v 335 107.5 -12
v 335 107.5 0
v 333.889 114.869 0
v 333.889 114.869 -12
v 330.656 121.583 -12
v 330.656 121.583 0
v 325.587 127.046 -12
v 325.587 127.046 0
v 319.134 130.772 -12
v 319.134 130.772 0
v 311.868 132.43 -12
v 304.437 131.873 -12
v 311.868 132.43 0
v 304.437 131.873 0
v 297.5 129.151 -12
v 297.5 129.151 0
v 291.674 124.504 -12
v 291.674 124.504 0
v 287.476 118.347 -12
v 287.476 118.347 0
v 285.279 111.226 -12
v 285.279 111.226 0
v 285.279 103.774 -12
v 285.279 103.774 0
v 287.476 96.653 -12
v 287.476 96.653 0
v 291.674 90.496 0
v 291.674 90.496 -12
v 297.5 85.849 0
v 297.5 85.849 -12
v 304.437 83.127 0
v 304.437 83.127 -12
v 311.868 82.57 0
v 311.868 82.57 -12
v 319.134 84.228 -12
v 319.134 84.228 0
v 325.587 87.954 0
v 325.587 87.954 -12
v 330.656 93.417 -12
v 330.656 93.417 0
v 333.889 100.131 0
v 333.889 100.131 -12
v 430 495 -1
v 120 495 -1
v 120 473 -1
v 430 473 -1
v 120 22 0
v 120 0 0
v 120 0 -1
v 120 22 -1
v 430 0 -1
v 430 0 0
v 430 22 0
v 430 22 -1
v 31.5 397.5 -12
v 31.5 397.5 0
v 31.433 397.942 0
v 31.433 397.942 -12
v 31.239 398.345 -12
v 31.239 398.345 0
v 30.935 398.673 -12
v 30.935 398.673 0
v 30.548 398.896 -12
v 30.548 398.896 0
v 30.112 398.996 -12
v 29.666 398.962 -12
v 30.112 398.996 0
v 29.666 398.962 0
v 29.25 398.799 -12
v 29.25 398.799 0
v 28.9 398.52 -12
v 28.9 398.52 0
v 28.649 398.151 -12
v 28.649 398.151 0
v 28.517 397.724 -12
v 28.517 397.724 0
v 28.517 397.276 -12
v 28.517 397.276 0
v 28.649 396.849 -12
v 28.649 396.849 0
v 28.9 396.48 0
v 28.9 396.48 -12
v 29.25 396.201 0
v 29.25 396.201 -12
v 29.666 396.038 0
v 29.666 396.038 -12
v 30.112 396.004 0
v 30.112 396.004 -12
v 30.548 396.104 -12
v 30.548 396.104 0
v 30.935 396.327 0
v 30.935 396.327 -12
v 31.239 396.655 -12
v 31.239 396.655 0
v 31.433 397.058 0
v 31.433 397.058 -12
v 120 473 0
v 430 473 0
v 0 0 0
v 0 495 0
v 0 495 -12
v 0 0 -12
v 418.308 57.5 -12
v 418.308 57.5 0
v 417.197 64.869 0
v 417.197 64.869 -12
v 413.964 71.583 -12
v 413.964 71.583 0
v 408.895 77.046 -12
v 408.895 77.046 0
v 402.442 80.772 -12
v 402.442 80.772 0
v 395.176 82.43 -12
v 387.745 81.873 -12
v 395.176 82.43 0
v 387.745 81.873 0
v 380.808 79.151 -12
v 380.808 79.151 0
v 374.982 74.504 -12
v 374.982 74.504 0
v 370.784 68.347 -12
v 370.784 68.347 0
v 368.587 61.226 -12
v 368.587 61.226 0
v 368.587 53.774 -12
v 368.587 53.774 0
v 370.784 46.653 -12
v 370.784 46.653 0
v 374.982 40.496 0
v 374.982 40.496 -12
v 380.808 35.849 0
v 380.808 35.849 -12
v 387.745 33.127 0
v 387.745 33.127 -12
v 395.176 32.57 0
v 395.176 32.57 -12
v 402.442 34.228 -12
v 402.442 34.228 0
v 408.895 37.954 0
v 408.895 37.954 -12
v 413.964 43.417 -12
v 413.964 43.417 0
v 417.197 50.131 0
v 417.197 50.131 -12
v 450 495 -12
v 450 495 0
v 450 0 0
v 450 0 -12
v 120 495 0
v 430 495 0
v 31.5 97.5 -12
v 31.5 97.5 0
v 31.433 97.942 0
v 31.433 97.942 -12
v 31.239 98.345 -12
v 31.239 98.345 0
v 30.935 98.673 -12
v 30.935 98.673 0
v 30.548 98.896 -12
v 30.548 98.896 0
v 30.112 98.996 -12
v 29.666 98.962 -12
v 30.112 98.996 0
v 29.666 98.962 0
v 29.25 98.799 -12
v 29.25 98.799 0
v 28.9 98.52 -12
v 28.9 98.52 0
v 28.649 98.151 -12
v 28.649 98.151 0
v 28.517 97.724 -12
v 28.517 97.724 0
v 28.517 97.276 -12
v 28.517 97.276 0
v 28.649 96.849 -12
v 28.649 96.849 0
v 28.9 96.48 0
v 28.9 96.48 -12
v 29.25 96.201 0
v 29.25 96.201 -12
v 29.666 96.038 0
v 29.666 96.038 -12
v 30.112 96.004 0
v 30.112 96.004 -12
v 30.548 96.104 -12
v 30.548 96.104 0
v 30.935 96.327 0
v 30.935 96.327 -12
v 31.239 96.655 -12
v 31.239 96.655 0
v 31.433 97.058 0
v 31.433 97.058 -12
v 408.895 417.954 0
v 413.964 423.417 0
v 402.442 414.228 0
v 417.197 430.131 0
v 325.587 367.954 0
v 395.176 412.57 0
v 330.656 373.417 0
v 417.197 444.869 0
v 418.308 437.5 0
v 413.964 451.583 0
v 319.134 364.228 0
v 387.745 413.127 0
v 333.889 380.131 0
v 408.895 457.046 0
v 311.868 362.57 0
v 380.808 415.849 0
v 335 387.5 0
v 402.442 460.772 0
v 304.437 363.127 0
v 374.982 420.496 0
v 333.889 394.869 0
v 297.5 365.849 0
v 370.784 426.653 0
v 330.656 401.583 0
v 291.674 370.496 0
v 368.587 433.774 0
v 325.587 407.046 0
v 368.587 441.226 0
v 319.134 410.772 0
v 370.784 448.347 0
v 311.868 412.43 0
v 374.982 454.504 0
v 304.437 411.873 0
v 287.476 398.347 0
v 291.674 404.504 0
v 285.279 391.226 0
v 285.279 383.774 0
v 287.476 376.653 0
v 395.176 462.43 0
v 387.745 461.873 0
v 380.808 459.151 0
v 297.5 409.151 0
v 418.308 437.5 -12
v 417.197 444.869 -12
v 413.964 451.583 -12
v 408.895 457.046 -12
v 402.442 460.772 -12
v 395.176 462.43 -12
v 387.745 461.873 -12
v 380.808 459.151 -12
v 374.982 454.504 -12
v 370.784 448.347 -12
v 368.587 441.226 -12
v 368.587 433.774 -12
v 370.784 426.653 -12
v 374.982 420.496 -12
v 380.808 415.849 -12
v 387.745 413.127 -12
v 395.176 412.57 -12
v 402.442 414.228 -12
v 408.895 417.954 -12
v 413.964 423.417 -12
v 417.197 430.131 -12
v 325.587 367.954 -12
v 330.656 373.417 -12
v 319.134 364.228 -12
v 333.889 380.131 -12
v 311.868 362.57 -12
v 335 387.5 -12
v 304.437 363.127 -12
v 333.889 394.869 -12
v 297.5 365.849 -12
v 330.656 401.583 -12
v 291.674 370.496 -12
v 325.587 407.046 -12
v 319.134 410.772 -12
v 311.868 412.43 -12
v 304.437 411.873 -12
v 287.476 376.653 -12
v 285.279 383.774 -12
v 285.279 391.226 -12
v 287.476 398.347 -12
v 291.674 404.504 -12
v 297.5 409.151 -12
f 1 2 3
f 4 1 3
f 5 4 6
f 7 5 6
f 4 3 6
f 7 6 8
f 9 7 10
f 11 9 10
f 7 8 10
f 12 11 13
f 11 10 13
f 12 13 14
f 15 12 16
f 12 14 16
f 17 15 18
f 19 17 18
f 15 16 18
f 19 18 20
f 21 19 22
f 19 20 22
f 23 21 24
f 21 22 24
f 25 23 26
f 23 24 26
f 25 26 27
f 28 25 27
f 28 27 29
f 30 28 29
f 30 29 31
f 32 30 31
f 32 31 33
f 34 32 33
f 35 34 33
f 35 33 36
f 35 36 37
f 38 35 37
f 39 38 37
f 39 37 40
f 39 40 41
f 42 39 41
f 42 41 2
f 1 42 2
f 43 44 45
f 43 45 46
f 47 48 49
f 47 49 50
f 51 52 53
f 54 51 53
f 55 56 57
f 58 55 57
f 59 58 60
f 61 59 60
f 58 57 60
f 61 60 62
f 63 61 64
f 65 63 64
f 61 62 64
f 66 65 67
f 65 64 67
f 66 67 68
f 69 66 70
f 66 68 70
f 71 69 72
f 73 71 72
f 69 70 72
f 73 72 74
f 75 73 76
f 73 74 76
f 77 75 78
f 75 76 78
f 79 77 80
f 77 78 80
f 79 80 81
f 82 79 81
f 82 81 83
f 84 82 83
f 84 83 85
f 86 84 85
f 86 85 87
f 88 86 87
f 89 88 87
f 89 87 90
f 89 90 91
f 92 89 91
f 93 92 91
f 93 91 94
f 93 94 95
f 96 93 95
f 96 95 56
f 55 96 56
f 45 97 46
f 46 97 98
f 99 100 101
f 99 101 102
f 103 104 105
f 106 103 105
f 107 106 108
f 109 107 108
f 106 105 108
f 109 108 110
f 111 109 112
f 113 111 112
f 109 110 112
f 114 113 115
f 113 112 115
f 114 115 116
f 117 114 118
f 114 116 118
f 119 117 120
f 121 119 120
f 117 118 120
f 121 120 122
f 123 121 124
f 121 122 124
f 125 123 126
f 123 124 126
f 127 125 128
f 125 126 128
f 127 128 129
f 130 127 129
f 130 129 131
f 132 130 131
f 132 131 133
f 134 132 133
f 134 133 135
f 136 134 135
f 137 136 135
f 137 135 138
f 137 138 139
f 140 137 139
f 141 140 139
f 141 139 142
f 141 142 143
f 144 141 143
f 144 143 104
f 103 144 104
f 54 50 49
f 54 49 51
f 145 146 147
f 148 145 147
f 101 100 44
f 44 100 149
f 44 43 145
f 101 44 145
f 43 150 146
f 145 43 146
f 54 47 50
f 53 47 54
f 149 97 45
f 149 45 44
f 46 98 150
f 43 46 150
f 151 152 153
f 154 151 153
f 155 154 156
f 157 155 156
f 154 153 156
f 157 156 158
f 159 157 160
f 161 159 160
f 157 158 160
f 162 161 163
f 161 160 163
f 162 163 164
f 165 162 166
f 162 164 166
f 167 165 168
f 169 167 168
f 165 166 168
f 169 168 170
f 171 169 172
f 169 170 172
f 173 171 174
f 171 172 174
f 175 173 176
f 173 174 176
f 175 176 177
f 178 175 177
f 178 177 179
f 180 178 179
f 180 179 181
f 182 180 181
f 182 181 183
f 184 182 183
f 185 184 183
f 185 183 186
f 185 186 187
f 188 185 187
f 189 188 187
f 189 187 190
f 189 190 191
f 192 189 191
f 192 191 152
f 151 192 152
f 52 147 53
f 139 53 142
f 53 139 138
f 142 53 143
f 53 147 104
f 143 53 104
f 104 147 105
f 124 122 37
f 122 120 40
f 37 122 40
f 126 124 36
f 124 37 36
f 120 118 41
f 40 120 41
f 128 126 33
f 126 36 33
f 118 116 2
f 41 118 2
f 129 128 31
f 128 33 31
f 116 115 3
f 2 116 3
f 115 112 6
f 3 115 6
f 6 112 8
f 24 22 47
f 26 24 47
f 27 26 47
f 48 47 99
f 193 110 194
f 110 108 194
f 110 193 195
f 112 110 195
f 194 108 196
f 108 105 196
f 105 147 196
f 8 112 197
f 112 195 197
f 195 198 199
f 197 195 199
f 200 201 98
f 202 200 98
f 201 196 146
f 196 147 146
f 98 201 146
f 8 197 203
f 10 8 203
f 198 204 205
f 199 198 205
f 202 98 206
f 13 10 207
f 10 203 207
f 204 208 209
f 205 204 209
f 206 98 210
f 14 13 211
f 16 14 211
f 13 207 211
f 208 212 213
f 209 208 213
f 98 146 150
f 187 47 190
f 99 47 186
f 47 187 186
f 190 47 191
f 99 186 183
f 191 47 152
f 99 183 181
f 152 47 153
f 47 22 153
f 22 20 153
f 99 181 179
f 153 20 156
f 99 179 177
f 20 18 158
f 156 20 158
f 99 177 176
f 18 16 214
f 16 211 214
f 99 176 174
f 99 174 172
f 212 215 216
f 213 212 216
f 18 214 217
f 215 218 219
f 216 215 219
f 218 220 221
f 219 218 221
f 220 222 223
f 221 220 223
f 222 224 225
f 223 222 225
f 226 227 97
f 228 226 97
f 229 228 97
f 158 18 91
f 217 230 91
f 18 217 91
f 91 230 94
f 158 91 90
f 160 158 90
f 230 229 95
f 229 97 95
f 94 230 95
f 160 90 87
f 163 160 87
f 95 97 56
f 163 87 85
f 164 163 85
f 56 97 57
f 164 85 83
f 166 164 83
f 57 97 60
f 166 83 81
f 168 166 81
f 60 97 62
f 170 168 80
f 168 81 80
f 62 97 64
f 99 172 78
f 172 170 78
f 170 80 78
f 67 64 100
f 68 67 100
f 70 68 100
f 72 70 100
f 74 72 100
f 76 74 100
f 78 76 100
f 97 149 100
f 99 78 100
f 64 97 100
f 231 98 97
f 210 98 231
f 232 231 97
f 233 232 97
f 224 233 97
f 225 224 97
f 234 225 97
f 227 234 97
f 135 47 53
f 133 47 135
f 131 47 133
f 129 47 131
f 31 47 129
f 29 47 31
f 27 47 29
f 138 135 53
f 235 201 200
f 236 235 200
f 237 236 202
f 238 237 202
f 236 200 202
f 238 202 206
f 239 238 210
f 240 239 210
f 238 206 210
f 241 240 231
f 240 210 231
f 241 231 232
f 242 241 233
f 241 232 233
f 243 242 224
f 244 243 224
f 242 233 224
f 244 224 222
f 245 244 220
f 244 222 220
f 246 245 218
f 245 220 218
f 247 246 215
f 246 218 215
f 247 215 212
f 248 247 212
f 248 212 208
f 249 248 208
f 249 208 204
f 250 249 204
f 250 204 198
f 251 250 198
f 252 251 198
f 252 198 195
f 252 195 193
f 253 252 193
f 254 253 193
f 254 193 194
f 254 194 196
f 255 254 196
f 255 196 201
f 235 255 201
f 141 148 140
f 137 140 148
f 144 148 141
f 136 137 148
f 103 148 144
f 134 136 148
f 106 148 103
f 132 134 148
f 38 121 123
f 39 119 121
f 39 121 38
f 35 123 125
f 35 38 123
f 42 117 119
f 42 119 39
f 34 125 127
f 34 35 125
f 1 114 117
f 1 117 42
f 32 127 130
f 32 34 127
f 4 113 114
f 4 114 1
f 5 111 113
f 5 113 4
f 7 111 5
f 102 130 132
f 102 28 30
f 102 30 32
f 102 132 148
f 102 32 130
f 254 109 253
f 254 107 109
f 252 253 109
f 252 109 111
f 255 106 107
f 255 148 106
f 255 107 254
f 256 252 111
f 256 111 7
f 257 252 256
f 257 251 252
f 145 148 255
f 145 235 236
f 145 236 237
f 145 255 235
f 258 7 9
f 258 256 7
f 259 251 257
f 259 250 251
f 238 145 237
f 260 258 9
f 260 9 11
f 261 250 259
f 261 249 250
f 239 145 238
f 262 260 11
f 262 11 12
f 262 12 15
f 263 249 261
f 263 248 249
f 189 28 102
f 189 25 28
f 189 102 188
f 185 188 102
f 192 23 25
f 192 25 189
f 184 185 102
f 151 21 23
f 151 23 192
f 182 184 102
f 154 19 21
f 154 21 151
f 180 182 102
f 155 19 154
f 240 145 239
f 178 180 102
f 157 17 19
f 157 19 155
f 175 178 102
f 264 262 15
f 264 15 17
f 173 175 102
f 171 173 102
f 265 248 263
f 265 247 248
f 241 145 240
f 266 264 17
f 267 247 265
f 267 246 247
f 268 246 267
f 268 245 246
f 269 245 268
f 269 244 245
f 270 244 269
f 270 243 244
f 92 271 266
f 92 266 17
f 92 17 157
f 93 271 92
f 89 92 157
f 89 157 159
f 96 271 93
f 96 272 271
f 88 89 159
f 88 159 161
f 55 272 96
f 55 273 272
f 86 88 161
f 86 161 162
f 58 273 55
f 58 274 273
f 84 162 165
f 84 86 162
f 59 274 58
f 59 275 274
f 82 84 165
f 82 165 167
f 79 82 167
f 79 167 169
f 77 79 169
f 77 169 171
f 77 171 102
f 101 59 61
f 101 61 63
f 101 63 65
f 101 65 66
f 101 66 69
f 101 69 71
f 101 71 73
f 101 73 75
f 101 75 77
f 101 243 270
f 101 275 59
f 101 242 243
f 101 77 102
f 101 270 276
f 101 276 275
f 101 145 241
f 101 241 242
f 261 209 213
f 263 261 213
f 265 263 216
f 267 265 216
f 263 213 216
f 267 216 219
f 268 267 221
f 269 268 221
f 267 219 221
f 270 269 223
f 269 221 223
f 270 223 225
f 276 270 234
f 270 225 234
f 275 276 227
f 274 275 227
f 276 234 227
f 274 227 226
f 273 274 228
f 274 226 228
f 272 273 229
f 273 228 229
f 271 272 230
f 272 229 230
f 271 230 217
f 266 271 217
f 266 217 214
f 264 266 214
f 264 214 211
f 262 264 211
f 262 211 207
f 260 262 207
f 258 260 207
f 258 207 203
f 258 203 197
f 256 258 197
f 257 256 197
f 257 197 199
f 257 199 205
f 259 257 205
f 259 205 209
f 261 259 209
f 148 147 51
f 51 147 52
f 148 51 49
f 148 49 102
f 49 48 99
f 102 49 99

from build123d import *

# Parameters (mm, degrees)
PAD_DEPTH       = 12
SKETCH004_R     = 25
POCKET001_DEPTH = 20
SKETCH005_R     = 1.5
POCKET_DEPTH    = 12.001
SKETCH006_W     = 310
SKETCH006_H     = 22
POCKET002_DEPTH = 1


with BuildPart() as part:
    # Sketch (on Part) → Pad (new body)
    with BuildSketch(Plane.XY):
        Polygon((0, 413.879036), (0, 495), (450, 495), (450, 0), (0, 0), align=None)
    extrude(amount=-PAD_DEPTH)

    # Sketch004 → Pocket001 (cut)
    with BuildSketch(Plane.XY):
        with Locations((393.308105, 437.5)):
            Circle(SKETCH004_R)
        with Locations((393.308105, 57.5)):
            Circle(SKETCH004_R)
        with Locations((310, 107.5)):
            Circle(SKETCH004_R)
        with Locations((310, 387.5)):
            Circle(SKETCH004_R)
    extrude(amount=-POCKET001_DEPTH, mode=Mode.SUBTRACT)

    # Sketch005 → Pocket (cut, through all)
    with BuildSketch(Plane.XY):
        with Locations((30, 397.5)):
            Circle(SKETCH005_R)
        with Locations((30, 97.5)):
            Circle(SKETCH005_R)
    extrude(amount=-POCKET_DEPTH, mode=Mode.SUBTRACT)

    # Sketch006 → Pocket002 (cut)
    with BuildSketch(Plane.XY):
        with Locations((275, 11)):
            Rectangle(SKETCH006_W, SKETCH006_H)
        with Locations((275, 484)):
            Rectangle(SKETCH006_W, SKETCH006_H)
    extrude(amount=-POCKET002_DEPTH, mode=Mode.SUBTRACT)


solid = part.part
